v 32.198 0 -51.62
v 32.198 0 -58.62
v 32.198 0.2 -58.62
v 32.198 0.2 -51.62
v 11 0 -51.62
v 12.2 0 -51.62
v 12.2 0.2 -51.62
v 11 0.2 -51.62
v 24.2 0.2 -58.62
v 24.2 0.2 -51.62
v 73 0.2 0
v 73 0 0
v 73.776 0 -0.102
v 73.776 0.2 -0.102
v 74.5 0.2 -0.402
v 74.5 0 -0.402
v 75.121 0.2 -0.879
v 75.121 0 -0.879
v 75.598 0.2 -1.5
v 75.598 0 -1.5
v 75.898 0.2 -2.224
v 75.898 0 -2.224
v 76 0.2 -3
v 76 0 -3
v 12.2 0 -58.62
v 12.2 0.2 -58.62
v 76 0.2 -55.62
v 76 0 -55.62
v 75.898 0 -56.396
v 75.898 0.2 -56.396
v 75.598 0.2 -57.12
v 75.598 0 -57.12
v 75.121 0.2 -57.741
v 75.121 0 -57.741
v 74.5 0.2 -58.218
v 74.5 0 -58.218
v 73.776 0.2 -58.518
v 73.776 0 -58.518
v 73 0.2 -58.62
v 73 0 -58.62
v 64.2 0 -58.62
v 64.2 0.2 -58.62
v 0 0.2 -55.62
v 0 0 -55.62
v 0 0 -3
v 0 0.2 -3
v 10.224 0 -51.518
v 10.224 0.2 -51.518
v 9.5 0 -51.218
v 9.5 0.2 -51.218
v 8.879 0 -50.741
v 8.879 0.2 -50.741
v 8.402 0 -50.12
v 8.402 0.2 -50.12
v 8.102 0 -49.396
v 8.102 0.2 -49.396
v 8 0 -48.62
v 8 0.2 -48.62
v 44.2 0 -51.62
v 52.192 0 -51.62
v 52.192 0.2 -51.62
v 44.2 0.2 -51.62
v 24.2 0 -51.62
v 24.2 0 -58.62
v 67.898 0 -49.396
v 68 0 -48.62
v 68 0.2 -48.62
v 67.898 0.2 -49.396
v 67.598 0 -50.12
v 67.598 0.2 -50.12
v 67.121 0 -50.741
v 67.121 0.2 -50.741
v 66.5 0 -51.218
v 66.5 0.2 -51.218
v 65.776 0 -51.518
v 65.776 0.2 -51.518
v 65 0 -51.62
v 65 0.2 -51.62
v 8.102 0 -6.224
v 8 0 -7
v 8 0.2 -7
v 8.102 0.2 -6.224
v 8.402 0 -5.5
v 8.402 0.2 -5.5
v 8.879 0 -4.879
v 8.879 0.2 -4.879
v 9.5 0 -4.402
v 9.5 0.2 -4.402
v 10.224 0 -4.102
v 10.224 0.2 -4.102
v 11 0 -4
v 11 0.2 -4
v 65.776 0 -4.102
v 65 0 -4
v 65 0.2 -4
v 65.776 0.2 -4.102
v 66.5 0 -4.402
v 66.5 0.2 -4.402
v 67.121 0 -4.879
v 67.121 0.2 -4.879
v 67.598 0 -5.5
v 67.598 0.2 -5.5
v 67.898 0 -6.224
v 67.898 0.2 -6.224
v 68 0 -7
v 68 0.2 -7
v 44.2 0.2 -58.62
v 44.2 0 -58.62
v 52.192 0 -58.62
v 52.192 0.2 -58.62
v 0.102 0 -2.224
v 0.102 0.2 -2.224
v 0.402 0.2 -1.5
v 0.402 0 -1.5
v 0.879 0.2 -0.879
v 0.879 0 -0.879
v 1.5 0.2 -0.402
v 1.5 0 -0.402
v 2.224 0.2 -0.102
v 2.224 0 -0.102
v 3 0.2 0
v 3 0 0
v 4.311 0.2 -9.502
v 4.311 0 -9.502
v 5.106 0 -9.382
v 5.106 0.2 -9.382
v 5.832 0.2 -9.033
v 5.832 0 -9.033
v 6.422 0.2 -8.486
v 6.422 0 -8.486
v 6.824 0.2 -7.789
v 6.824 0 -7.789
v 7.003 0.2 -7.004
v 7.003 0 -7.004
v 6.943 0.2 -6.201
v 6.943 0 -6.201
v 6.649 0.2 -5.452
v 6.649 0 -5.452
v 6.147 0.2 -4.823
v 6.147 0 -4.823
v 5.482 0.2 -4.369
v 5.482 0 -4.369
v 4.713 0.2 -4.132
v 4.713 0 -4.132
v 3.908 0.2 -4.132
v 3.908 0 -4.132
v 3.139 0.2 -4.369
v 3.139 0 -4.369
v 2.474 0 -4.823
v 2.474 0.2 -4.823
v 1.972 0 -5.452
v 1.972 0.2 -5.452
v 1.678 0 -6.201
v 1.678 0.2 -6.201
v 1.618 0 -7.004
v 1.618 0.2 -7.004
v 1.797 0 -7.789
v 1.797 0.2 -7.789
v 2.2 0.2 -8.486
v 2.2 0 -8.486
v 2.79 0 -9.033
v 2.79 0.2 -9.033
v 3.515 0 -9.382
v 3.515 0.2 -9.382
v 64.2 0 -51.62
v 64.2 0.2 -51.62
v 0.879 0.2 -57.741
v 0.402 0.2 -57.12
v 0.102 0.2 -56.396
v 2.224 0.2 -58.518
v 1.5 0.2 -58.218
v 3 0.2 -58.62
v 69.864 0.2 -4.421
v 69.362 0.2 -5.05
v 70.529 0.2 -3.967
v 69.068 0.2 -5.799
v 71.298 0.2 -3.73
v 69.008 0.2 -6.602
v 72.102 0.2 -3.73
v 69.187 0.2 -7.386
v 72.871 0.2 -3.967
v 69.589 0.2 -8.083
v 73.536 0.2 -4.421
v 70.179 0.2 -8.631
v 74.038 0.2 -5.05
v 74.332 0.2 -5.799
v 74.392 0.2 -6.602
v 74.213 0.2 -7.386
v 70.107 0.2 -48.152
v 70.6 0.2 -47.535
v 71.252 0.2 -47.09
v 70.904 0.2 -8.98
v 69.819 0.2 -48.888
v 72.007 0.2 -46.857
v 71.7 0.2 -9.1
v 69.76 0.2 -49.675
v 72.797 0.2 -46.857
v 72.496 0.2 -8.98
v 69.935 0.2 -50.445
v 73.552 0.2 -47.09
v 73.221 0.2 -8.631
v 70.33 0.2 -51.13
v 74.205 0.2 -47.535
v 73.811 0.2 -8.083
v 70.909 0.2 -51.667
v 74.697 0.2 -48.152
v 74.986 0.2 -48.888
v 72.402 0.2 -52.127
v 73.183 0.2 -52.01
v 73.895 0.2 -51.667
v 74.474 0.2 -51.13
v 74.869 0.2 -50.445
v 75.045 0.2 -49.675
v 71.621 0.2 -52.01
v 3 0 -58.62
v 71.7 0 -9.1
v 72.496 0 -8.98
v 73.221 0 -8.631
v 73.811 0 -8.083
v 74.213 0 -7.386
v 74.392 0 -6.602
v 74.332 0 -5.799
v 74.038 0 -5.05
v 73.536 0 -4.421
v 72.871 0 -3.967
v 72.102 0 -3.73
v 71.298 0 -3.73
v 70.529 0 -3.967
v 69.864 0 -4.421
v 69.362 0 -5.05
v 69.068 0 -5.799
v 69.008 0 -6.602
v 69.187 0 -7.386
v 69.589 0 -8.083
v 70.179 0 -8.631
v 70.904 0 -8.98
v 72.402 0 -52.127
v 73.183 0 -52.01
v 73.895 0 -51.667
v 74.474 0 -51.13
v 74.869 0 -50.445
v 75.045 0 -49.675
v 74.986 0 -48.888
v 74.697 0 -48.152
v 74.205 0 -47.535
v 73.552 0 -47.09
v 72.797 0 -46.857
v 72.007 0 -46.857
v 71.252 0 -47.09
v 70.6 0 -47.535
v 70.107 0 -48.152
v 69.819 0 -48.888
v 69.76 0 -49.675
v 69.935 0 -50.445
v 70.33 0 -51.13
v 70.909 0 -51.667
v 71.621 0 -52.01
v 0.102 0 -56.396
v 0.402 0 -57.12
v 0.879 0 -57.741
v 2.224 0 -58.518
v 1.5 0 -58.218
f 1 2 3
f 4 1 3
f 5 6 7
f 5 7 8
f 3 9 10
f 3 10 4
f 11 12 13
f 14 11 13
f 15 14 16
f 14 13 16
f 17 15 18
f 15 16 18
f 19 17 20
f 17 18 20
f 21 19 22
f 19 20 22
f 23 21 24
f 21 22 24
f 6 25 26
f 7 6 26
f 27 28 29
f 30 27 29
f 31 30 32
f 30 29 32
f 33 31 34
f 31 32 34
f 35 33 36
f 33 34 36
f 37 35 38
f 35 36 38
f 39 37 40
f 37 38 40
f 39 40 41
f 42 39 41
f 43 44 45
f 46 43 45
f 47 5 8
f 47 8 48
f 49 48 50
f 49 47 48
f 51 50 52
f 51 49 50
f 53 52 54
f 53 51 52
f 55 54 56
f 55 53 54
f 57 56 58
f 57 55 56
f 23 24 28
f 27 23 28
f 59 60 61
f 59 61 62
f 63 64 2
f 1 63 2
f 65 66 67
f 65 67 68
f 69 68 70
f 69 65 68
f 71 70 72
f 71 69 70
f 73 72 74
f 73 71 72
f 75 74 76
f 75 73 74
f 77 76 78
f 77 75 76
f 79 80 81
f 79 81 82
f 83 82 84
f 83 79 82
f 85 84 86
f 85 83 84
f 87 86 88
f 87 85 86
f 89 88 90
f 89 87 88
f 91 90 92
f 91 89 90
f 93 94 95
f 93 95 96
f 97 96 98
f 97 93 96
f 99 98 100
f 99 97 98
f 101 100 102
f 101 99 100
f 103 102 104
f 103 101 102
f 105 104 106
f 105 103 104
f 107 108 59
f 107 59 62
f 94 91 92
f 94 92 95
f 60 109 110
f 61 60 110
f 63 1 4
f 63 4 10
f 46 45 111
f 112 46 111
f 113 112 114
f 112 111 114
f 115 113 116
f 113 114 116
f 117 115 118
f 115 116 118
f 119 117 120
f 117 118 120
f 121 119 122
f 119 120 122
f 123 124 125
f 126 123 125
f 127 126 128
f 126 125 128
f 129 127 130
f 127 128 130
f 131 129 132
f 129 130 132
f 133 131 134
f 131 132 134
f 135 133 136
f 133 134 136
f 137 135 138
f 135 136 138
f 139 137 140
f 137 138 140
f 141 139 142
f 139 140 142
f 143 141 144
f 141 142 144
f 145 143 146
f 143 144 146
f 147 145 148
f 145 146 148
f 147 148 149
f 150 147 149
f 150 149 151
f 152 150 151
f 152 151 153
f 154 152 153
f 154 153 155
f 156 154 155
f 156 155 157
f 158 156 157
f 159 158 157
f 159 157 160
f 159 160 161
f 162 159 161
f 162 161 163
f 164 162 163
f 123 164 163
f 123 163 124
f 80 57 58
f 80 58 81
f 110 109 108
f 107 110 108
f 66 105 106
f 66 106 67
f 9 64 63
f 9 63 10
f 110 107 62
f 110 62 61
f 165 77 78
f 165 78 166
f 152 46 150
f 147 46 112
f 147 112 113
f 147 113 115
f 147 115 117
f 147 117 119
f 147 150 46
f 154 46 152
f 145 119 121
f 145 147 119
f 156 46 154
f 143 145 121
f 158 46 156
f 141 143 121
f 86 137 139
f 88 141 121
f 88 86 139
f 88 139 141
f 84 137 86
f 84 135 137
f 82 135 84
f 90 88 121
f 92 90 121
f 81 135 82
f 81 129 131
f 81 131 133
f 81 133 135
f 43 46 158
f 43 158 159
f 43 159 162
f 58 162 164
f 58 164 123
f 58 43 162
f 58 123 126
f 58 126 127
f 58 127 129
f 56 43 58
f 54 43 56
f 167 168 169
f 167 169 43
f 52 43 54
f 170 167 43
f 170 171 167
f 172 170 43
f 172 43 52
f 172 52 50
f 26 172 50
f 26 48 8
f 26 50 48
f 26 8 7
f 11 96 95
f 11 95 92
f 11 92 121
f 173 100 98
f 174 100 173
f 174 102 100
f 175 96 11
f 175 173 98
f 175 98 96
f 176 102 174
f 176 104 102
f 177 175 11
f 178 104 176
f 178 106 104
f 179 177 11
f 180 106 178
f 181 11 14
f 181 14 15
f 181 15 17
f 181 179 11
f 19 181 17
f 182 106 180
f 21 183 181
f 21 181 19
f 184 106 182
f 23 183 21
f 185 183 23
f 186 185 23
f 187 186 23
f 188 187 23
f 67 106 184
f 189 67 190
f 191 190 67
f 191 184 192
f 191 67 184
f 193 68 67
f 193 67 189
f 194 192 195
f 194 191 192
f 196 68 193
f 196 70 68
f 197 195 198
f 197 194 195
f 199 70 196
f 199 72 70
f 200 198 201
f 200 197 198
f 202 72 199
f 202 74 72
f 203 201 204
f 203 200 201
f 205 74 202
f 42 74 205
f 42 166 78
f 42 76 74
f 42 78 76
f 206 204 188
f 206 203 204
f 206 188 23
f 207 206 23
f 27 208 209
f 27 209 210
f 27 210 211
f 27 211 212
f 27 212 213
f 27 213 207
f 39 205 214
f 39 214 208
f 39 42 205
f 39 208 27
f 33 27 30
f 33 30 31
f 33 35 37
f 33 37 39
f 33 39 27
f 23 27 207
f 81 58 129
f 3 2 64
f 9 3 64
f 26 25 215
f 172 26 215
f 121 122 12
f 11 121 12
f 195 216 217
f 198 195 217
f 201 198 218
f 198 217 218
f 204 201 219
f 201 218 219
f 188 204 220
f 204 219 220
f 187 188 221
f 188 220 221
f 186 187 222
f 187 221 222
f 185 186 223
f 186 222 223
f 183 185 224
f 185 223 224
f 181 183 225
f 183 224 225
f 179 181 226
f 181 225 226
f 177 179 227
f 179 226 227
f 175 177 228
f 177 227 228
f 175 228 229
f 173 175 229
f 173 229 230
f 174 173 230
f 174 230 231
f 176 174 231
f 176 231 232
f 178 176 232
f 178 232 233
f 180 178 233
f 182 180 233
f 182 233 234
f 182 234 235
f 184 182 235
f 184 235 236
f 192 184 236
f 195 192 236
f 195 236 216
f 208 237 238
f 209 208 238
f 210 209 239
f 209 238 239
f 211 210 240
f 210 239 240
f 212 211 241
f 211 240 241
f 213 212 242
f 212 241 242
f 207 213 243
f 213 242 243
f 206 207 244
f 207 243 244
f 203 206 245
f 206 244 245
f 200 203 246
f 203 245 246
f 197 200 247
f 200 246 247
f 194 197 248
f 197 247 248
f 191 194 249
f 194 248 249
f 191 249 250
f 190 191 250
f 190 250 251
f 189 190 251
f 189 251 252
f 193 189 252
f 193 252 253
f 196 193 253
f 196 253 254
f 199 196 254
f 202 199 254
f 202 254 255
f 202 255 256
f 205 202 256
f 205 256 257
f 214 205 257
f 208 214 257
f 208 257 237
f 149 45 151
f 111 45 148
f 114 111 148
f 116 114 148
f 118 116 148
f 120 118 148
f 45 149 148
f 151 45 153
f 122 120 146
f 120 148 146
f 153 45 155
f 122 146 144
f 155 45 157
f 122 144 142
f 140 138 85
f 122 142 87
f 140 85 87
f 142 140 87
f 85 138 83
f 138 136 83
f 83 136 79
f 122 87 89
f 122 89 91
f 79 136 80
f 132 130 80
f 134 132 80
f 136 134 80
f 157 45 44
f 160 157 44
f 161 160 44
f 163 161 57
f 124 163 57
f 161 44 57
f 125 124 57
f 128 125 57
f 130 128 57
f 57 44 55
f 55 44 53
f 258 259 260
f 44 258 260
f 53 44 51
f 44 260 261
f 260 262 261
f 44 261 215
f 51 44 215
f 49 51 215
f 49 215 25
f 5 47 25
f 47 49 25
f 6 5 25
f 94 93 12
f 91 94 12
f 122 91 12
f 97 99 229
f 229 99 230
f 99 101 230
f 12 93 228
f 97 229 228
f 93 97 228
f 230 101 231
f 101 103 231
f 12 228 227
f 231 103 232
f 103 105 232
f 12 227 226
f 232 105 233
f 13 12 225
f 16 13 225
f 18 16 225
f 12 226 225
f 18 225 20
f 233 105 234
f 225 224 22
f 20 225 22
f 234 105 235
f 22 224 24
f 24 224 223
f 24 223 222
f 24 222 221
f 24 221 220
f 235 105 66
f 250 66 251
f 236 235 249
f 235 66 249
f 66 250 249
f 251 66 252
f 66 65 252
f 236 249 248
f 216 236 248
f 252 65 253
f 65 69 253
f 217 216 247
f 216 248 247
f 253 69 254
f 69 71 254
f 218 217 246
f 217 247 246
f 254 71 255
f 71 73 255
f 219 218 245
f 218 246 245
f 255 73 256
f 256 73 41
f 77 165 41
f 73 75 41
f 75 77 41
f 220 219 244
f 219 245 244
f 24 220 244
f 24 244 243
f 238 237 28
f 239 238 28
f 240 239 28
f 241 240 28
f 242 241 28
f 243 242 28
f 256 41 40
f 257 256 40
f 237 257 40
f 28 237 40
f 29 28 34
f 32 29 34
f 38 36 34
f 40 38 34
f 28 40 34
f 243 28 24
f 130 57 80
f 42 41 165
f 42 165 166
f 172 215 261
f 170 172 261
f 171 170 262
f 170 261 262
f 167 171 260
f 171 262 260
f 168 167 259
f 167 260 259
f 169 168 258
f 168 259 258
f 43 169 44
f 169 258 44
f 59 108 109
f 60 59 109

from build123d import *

# Parameters (mm, degrees)
BOSS_EXTRUDE1_DEPTH = 0.2
SKETCH4_W           = 12.007758181
SKETCH4_H           = 0.2
SKETCH4_W_2         = 12.001595936
SKETCH4_W_3         = 12
CUT_EXTRUDE3_DEPTH  = 7
SKETCH5_R           = 2.65
CUT_EXTRUDE4_DEPTH  = 96.980958528
SKETCH6_R           = 2.7
CUT_EXTRUDE5_DEPTH  = 96.980958528
SKETCH7_R           = 2.7
CUT_EXTRUDE6_DEPTH  = 96.980958528


with BuildPart() as part:
    # Sketch1 → Boss-Extrude1 (new body)
    with BuildSketch(Plane(origin=(0, 0, 0), x_dir=(1, 0, 0), z_dir=(0, 1, 0))):
        with BuildLine():
            Line((3, 0), (73, 0))
            ThreePointArc((73, 0), (75.121320344, 0.878679656), (76, 3))
            Line((76, 3), (76, 52.62))
            Line((76, 52.62), (76, 55.62))
            ThreePointArc((76, 55.62), (75.121320344, 57.741320344), (73, 58.62))
            Line((73, 58.62), (3, 58.62))
            ThreePointArc((3, 58.62), (0.878679656, 57.741320344), (0, 55.62))
            Line((0, 55.62), (0, 52.62))
            Line((0, 52.62), (0, 3))
            ThreePointArc((0, 3), (0.878679656, 0.878679656), (3, 0))
        make_face()
        with BuildLine():
            Line((11, 4), (65, 4))
            ThreePointArc((65, 4), (67.121320344, 4.878679656), (68, 7))
            Line((68, 7), (68, 48.62))
            ThreePointArc((68, 48.62), (67.121320344, 50.741320344), (65, 51.62))
            Line((65, 51.62), (11, 51.62))
            ThreePointArc((11, 51.62), (8.878679656, 50.741320344), (8, 48.62))
            Line((8, 48.62), (8, 7))
            ThreePointArc((8, 7), (8.878679656, 4.878679656), (11, 4))
        make_face(mode=Mode.SUBTRACT)
    extrude(amount=BOSS_EXTRUDE1_DEPTH)

    # Sketch4 → Cut-Extrude3 (cut)
    with BuildSketch(Plane(origin=(0, 0, -58.62), x_dir=(-1, 0, 0), z_dir=(0, 0, -1))):
        with Locations((-58.19612091, 0.1)):
            Rectangle(SKETCH4_W, SKETCH4_H)
        with Locations((-38.199202032, 0.1)):
            Rectangle(SKETCH4_W_2, SKETCH4_H)
        with Locations((-18.2, 0.1)):
            Rectangle(SKETCH4_W_3, SKETCH4_H)
    extrude(amount=-CUT_EXTRUDE3_DEPTH, mode=Mode.SUBTRACT)


with BuildPart() as cut_extrude3_piece_1:
    # of the separate pieces the step leaves, piece 1, a body of its own (cut_extrude3_pieces)
    add(part.part.solids().sort_by_distance((3, 0, 0))[0])

    # Sketch5 → Cut-Extrude4 (cut, through all)
    with BuildSketch(Plane(origin=(0, 0, 0), x_dir=(-1, 0, 0), z_dir=(0, -1, 0))):
        with Locations(Location((-72.402273283, 49.4772806, 0), (0, 0, 90))):
            Circle(SKETCH5_R)
    extrude(amount=-CUT_EXTRUDE4_DEPTH, mode=Mode.SUBTRACT)

    # Sketch6 → Cut-Extrude5 (cut, through all)
    with BuildSketch(Plane(origin=(0, 0, 0), x_dir=(-1, 0, 0), z_dir=(0, -1, 0))):
        with Locations(Location((-4.310637365, 6.802083571, 0), (0, 0, 90))):
            Circle(SKETCH6_R)
    extrude(amount=-CUT_EXTRUDE5_DEPTH, mode=Mode.SUBTRACT)

    # Sketch7 → Cut-Extrude6 (cut, through all)
    with BuildSketch(Plane(origin=(0, 0, 0), x_dir=(-1, 0, 0), z_dir=(0, -1, 0))):
        with Locations(Location((-71.7, 6.4, 0), (0, 0, 90))):
            Circle(SKETCH7_R)
    extrude(amount=-CUT_EXTRUDE6_DEPTH, mode=Mode.SUBTRACT)


with BuildPart() as cut_extrude3_piece_2:
    # of the separate pieces the step leaves, piece 2, a body of its own (cut_extrude3_pieces)
    add(part.part.solids().sort_by_distance((32.198404064, 0, -58.62))[0])


with BuildPart() as cut_extrude3_piece_3:
    # of the separate pieces the step leaves, piece 3, a body of its own (cut_extrude3_pieces)
    add(part.part.solids().sort_by_distance((52.192241819, 0, -58.62))[0])


solid = Compound([cut_extrude3_piece_1.part, cut_extrude3_piece_2.part, cut_extrude3_piece_3.part])
